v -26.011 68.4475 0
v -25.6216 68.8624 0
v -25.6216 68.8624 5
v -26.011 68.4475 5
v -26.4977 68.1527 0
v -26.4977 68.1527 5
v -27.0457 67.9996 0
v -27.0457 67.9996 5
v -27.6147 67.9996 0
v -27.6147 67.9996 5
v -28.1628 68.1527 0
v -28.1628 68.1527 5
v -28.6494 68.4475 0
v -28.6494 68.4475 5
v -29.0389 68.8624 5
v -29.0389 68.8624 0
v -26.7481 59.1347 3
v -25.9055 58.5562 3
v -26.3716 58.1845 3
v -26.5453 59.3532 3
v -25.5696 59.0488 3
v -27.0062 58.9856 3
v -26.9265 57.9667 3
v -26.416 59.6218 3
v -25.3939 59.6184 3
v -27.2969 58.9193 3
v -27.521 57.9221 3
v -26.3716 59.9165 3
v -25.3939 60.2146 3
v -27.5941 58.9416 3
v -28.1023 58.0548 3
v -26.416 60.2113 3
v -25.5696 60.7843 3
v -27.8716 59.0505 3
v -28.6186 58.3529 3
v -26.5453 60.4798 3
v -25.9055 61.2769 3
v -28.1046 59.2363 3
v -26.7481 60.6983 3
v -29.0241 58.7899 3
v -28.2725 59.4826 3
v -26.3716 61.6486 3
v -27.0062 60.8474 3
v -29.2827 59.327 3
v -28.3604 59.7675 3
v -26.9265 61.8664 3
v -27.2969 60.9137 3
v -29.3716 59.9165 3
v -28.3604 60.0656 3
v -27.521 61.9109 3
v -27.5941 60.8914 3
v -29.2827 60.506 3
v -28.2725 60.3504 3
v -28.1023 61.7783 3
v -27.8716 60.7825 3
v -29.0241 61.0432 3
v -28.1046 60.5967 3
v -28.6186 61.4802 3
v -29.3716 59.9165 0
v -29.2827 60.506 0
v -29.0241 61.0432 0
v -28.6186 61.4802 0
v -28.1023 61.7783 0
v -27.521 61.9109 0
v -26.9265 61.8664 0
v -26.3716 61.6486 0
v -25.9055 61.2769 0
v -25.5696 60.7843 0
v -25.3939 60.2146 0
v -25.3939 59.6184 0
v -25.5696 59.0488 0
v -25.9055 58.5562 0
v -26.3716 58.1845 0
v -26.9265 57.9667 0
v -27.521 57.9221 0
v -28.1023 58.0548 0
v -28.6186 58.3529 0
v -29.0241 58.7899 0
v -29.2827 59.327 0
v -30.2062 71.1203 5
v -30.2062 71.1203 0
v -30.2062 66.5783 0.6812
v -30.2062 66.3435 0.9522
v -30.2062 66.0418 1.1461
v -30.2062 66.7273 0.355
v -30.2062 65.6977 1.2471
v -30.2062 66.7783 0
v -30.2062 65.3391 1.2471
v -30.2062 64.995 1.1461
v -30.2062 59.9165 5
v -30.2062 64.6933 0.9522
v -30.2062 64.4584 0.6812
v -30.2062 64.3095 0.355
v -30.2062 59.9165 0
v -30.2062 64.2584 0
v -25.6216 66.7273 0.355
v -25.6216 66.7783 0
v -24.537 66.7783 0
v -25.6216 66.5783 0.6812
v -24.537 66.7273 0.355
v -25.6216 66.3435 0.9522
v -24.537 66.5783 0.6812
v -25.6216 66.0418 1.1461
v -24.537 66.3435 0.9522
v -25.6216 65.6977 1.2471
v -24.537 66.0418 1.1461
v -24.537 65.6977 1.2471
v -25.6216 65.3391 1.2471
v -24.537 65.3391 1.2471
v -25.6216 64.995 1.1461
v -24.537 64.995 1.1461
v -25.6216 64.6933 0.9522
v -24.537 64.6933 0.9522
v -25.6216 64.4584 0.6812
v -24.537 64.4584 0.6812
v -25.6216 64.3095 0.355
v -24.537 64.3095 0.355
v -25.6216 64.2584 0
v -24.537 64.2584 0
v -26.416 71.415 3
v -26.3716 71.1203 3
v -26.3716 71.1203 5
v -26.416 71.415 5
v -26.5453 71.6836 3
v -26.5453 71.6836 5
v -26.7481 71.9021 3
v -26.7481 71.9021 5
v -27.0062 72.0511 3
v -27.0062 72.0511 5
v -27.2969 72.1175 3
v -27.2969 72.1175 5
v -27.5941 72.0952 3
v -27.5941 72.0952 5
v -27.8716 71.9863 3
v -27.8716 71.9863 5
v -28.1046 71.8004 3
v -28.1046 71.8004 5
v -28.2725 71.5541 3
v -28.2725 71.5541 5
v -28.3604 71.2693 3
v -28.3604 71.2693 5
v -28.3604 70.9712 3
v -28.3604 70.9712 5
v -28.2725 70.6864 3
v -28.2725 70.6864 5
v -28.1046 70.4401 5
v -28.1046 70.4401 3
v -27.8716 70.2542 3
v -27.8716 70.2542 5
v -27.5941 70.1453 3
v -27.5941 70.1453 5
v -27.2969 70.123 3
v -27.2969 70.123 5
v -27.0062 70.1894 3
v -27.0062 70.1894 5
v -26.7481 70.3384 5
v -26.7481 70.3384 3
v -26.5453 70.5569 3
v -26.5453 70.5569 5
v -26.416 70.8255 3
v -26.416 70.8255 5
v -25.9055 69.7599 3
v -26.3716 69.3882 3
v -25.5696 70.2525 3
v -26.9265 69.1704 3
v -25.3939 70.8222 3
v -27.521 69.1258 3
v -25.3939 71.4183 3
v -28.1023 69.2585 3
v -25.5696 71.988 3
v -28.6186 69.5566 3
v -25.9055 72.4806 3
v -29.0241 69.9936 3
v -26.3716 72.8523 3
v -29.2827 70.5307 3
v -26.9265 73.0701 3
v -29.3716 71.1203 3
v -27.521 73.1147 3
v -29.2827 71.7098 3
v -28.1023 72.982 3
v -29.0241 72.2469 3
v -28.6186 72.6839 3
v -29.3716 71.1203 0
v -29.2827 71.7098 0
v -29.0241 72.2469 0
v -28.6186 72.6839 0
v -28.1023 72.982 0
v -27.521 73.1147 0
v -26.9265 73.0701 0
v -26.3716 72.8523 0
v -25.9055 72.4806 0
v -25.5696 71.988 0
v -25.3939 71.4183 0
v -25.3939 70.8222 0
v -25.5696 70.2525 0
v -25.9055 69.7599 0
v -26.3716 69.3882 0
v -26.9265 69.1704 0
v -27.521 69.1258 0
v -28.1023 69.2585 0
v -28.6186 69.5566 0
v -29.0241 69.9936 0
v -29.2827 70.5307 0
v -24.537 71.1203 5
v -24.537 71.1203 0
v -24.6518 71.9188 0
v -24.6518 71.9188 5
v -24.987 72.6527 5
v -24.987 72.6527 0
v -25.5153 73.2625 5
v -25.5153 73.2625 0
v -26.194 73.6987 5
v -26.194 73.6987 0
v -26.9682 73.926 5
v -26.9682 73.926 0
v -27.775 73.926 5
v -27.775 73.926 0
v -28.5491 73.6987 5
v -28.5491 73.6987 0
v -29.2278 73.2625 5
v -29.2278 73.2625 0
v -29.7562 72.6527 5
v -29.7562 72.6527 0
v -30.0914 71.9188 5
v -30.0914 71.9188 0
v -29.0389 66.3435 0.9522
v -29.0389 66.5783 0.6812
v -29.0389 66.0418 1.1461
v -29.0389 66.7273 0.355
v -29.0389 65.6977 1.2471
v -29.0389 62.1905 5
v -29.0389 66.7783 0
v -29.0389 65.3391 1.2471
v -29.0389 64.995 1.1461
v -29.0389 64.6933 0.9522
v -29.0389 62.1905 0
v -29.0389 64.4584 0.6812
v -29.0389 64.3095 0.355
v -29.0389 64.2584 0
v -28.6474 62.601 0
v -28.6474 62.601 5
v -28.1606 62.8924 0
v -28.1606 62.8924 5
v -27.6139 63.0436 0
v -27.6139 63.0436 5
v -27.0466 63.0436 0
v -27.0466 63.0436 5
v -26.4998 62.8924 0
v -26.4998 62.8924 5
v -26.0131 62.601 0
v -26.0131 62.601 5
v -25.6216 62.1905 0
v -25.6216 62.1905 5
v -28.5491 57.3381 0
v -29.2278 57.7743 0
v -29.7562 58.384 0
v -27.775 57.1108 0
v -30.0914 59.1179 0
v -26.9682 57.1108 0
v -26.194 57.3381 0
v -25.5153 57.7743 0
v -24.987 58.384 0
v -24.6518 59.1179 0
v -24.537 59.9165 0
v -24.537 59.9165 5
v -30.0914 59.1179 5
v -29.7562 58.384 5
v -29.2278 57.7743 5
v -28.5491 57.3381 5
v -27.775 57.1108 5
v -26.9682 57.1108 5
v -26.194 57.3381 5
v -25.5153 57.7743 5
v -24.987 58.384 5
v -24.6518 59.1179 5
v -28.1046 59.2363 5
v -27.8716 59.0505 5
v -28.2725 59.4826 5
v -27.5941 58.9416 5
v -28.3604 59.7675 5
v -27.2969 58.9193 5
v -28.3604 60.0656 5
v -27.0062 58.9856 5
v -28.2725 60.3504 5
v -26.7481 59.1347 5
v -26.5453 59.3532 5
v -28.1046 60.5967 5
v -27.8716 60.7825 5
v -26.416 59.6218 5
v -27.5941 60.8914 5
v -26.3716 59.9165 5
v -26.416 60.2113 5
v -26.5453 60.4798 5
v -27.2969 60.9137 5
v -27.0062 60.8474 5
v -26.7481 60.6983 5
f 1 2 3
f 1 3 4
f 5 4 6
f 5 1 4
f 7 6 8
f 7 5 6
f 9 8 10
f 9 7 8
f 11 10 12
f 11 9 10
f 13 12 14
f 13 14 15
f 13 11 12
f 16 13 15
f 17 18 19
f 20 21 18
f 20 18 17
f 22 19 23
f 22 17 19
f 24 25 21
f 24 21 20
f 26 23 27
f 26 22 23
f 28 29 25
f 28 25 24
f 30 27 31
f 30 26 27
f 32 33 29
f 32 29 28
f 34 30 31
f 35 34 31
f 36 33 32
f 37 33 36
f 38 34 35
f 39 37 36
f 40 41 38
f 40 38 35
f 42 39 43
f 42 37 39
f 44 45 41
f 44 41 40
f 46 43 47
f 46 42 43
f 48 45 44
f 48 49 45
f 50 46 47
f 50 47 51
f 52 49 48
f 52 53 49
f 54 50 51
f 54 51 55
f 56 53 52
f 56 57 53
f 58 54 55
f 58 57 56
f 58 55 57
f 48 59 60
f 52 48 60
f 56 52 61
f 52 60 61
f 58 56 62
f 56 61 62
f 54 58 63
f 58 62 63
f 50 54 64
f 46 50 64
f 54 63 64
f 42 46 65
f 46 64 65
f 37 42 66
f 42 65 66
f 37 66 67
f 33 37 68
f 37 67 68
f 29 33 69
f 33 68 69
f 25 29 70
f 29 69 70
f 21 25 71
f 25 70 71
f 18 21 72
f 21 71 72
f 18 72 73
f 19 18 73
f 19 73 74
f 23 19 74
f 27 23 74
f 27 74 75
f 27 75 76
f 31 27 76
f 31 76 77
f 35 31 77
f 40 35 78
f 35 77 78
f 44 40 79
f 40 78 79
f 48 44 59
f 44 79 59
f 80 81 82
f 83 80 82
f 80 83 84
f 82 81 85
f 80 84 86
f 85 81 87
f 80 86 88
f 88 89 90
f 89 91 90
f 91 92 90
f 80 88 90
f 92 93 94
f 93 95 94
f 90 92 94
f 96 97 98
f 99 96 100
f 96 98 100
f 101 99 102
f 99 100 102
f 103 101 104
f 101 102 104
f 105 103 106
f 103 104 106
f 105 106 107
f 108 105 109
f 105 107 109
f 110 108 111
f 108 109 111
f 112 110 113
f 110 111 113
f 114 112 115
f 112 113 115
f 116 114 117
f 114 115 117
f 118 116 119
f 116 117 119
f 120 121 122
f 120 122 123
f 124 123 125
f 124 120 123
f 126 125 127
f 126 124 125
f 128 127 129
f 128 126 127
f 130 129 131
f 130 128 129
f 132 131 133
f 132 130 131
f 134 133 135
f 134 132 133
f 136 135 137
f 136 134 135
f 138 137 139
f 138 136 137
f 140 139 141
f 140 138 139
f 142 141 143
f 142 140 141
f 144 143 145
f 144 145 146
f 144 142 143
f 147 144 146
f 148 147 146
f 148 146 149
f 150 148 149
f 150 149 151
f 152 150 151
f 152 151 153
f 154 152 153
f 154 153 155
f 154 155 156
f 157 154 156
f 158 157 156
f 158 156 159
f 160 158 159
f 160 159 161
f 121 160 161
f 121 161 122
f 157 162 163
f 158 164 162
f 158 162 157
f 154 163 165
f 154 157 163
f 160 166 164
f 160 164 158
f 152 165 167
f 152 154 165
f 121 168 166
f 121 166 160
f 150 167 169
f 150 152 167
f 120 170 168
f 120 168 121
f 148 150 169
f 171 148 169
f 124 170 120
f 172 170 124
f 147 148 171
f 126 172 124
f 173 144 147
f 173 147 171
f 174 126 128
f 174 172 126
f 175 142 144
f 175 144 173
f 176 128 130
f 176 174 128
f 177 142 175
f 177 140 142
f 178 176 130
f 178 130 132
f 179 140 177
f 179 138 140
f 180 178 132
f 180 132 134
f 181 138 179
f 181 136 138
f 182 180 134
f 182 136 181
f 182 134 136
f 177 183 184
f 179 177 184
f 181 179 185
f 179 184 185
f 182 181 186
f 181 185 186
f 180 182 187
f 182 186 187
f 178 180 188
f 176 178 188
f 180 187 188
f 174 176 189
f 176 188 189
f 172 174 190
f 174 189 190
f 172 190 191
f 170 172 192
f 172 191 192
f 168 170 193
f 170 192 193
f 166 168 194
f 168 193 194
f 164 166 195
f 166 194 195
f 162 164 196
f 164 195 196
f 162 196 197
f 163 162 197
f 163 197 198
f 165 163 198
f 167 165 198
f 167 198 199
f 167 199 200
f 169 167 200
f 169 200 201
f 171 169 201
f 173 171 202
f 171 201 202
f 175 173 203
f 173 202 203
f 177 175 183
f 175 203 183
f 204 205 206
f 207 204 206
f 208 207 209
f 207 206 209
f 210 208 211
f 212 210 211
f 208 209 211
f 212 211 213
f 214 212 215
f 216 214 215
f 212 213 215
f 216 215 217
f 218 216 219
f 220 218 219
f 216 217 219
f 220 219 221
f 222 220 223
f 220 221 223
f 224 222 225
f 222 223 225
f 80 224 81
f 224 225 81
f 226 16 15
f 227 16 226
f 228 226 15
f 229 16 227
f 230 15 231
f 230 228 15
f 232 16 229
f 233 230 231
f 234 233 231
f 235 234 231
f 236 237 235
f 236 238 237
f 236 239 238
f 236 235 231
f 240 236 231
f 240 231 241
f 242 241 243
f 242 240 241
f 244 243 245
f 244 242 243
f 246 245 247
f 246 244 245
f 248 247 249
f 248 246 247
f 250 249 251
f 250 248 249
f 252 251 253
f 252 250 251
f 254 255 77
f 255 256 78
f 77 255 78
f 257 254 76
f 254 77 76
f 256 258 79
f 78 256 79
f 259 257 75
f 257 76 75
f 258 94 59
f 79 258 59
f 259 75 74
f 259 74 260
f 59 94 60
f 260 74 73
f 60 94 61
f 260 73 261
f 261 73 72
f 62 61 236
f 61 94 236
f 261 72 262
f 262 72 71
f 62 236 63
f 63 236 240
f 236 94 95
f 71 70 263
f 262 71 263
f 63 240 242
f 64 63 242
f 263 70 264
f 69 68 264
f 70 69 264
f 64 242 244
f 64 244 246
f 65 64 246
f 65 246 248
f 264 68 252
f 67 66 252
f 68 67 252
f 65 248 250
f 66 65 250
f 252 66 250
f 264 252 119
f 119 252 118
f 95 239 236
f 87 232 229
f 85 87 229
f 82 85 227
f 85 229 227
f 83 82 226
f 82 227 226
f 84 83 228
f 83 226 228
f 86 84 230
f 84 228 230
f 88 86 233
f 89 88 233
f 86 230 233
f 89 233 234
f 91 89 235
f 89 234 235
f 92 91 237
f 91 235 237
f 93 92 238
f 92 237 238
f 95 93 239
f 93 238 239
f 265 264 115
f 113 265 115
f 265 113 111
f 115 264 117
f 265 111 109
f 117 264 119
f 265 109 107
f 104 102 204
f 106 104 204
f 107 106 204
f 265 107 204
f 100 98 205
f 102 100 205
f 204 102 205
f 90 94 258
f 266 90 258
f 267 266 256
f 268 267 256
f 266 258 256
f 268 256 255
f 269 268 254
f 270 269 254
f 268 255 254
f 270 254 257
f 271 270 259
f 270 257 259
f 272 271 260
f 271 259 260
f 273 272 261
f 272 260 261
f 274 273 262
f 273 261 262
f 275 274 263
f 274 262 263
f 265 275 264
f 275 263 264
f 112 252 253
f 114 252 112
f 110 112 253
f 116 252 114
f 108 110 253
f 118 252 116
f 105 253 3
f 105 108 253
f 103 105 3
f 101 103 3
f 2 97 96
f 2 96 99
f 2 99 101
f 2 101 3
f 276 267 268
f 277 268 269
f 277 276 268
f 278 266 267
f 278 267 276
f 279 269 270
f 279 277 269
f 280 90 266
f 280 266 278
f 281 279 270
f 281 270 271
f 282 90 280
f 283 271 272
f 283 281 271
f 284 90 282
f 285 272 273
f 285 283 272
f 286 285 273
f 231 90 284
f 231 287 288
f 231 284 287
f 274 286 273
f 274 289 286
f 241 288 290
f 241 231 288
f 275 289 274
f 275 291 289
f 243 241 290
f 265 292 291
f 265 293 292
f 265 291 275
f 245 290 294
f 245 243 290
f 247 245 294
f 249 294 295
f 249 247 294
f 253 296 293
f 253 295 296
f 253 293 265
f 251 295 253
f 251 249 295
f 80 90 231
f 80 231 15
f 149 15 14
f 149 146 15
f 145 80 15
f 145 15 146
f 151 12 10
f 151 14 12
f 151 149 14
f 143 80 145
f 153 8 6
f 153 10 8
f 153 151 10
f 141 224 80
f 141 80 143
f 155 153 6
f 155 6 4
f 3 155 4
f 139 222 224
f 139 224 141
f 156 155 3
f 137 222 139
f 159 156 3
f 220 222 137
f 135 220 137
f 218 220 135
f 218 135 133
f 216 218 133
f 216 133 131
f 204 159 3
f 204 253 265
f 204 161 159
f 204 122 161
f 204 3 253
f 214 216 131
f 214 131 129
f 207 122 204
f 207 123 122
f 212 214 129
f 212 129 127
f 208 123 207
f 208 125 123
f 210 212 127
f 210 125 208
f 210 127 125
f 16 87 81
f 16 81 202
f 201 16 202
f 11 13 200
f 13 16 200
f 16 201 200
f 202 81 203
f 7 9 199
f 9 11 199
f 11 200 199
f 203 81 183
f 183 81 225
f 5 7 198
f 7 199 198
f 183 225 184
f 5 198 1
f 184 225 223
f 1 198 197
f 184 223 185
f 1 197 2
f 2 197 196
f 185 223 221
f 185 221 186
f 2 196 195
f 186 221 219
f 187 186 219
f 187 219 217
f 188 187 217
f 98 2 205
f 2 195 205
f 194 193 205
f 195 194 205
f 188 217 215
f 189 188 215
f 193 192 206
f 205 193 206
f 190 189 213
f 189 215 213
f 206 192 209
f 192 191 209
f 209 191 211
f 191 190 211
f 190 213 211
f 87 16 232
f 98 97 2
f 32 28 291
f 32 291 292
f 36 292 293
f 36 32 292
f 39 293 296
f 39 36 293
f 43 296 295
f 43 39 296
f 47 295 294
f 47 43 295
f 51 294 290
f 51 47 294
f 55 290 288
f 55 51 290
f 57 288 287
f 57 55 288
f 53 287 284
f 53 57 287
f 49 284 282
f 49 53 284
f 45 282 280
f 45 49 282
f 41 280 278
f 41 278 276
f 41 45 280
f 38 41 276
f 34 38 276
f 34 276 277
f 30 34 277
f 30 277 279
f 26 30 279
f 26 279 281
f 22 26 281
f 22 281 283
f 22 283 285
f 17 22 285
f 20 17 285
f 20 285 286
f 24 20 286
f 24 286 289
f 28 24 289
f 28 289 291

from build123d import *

# Parameters (mm, degrees)
ESQUISSE1_R             = 1
EXTRUSION1_DEPTH        = 5
ESQUISSE2_R             = 1.259960856
ENL_V_MAT_EXTRU_1_DEPTH = 15
ESQUISSE3_R             = 2
ENL_V_MAT_EXTRU_2_DEPTH = 3


with BuildPart() as part:
    # Esquisse1 → Extrusion1 (new body)
    with BuildSketch(Plane.XY):
        with BuildLine():
            Line((-30.206178794, 71.120250568), (-30.206178794, 59.916517686))
            ThreePointArc((-30.206178794, 59.916517686), (-27.371580774, 57.081919667), (-24.536982754, 59.916517686))
            Line((-24.536982754, 59.916517686), (-24.536982754, 71.120250568))
            ThreePointArc((-24.536982754, 71.120250568), (-27.371580774, 73.954848588), (-30.206178794, 71.120250568))
        make_face()
        with Locations((-27.371580774, 59.916517686)):
            Circle(ESQUISSE1_R, mode=Mode.SUBTRACT)
        with Locations((-27.371580774, 71.120250568)):
            Circle(ESQUISSE1_R, mode=Mode.SUBTRACT)
        with BuildLine():
            Line((-29.038880927, 68.862401416), (-29.038880927, 62.190489948))
            ThreePointArc((-29.038880927, 62.190489948), (-27.330220673, 63.062743756), (-25.621560419, 62.190489948))
            Line((-25.621560419, 62.190489948), (-25.621560419, 68.862401416))
            ThreePointArc((-25.621560419, 68.862401416), (-27.330220673, 67.980247638), (-29.038880927, 68.862401416))
        make_face(mode=Mode.SUBTRACT)
    extrude(amount=EXTRUSION1_DEPTH)

    # Esquisse2 → Enlèv. mat.-Extru.1 (cut)
    with BuildSketch(Plane(origin=(-24.536982754, 0, 0), x_dir=(0, 0, -1), z_dir=(1, 0, 0))):
        with Locations((0, 65.518384127)):
            Circle(ESQUISSE2_R)
    extrude(amount=-ENL_V_MAT_EXTRU_1_DEPTH, mode=Mode.SUBTRACT)

    # Esquisse3 → Enlèv. mat.-Extru.2 (cut)
    with BuildSketch(Plane(origin=(0, 0, 0), x_dir=(-1, 0, 0), z_dir=(0, 0, -1))):
        with Locations((27.371580774, 71.120250568)):
            Circle(ESQUISSE3_R)
        with Locations((27.371580774, 59.916517686)):
            Circle(ESQUISSE3_R)
    extrude(amount=-ENL_V_MAT_EXTRU_2_DEPTH, mode=Mode.SUBTRACT)


solid = part.part
